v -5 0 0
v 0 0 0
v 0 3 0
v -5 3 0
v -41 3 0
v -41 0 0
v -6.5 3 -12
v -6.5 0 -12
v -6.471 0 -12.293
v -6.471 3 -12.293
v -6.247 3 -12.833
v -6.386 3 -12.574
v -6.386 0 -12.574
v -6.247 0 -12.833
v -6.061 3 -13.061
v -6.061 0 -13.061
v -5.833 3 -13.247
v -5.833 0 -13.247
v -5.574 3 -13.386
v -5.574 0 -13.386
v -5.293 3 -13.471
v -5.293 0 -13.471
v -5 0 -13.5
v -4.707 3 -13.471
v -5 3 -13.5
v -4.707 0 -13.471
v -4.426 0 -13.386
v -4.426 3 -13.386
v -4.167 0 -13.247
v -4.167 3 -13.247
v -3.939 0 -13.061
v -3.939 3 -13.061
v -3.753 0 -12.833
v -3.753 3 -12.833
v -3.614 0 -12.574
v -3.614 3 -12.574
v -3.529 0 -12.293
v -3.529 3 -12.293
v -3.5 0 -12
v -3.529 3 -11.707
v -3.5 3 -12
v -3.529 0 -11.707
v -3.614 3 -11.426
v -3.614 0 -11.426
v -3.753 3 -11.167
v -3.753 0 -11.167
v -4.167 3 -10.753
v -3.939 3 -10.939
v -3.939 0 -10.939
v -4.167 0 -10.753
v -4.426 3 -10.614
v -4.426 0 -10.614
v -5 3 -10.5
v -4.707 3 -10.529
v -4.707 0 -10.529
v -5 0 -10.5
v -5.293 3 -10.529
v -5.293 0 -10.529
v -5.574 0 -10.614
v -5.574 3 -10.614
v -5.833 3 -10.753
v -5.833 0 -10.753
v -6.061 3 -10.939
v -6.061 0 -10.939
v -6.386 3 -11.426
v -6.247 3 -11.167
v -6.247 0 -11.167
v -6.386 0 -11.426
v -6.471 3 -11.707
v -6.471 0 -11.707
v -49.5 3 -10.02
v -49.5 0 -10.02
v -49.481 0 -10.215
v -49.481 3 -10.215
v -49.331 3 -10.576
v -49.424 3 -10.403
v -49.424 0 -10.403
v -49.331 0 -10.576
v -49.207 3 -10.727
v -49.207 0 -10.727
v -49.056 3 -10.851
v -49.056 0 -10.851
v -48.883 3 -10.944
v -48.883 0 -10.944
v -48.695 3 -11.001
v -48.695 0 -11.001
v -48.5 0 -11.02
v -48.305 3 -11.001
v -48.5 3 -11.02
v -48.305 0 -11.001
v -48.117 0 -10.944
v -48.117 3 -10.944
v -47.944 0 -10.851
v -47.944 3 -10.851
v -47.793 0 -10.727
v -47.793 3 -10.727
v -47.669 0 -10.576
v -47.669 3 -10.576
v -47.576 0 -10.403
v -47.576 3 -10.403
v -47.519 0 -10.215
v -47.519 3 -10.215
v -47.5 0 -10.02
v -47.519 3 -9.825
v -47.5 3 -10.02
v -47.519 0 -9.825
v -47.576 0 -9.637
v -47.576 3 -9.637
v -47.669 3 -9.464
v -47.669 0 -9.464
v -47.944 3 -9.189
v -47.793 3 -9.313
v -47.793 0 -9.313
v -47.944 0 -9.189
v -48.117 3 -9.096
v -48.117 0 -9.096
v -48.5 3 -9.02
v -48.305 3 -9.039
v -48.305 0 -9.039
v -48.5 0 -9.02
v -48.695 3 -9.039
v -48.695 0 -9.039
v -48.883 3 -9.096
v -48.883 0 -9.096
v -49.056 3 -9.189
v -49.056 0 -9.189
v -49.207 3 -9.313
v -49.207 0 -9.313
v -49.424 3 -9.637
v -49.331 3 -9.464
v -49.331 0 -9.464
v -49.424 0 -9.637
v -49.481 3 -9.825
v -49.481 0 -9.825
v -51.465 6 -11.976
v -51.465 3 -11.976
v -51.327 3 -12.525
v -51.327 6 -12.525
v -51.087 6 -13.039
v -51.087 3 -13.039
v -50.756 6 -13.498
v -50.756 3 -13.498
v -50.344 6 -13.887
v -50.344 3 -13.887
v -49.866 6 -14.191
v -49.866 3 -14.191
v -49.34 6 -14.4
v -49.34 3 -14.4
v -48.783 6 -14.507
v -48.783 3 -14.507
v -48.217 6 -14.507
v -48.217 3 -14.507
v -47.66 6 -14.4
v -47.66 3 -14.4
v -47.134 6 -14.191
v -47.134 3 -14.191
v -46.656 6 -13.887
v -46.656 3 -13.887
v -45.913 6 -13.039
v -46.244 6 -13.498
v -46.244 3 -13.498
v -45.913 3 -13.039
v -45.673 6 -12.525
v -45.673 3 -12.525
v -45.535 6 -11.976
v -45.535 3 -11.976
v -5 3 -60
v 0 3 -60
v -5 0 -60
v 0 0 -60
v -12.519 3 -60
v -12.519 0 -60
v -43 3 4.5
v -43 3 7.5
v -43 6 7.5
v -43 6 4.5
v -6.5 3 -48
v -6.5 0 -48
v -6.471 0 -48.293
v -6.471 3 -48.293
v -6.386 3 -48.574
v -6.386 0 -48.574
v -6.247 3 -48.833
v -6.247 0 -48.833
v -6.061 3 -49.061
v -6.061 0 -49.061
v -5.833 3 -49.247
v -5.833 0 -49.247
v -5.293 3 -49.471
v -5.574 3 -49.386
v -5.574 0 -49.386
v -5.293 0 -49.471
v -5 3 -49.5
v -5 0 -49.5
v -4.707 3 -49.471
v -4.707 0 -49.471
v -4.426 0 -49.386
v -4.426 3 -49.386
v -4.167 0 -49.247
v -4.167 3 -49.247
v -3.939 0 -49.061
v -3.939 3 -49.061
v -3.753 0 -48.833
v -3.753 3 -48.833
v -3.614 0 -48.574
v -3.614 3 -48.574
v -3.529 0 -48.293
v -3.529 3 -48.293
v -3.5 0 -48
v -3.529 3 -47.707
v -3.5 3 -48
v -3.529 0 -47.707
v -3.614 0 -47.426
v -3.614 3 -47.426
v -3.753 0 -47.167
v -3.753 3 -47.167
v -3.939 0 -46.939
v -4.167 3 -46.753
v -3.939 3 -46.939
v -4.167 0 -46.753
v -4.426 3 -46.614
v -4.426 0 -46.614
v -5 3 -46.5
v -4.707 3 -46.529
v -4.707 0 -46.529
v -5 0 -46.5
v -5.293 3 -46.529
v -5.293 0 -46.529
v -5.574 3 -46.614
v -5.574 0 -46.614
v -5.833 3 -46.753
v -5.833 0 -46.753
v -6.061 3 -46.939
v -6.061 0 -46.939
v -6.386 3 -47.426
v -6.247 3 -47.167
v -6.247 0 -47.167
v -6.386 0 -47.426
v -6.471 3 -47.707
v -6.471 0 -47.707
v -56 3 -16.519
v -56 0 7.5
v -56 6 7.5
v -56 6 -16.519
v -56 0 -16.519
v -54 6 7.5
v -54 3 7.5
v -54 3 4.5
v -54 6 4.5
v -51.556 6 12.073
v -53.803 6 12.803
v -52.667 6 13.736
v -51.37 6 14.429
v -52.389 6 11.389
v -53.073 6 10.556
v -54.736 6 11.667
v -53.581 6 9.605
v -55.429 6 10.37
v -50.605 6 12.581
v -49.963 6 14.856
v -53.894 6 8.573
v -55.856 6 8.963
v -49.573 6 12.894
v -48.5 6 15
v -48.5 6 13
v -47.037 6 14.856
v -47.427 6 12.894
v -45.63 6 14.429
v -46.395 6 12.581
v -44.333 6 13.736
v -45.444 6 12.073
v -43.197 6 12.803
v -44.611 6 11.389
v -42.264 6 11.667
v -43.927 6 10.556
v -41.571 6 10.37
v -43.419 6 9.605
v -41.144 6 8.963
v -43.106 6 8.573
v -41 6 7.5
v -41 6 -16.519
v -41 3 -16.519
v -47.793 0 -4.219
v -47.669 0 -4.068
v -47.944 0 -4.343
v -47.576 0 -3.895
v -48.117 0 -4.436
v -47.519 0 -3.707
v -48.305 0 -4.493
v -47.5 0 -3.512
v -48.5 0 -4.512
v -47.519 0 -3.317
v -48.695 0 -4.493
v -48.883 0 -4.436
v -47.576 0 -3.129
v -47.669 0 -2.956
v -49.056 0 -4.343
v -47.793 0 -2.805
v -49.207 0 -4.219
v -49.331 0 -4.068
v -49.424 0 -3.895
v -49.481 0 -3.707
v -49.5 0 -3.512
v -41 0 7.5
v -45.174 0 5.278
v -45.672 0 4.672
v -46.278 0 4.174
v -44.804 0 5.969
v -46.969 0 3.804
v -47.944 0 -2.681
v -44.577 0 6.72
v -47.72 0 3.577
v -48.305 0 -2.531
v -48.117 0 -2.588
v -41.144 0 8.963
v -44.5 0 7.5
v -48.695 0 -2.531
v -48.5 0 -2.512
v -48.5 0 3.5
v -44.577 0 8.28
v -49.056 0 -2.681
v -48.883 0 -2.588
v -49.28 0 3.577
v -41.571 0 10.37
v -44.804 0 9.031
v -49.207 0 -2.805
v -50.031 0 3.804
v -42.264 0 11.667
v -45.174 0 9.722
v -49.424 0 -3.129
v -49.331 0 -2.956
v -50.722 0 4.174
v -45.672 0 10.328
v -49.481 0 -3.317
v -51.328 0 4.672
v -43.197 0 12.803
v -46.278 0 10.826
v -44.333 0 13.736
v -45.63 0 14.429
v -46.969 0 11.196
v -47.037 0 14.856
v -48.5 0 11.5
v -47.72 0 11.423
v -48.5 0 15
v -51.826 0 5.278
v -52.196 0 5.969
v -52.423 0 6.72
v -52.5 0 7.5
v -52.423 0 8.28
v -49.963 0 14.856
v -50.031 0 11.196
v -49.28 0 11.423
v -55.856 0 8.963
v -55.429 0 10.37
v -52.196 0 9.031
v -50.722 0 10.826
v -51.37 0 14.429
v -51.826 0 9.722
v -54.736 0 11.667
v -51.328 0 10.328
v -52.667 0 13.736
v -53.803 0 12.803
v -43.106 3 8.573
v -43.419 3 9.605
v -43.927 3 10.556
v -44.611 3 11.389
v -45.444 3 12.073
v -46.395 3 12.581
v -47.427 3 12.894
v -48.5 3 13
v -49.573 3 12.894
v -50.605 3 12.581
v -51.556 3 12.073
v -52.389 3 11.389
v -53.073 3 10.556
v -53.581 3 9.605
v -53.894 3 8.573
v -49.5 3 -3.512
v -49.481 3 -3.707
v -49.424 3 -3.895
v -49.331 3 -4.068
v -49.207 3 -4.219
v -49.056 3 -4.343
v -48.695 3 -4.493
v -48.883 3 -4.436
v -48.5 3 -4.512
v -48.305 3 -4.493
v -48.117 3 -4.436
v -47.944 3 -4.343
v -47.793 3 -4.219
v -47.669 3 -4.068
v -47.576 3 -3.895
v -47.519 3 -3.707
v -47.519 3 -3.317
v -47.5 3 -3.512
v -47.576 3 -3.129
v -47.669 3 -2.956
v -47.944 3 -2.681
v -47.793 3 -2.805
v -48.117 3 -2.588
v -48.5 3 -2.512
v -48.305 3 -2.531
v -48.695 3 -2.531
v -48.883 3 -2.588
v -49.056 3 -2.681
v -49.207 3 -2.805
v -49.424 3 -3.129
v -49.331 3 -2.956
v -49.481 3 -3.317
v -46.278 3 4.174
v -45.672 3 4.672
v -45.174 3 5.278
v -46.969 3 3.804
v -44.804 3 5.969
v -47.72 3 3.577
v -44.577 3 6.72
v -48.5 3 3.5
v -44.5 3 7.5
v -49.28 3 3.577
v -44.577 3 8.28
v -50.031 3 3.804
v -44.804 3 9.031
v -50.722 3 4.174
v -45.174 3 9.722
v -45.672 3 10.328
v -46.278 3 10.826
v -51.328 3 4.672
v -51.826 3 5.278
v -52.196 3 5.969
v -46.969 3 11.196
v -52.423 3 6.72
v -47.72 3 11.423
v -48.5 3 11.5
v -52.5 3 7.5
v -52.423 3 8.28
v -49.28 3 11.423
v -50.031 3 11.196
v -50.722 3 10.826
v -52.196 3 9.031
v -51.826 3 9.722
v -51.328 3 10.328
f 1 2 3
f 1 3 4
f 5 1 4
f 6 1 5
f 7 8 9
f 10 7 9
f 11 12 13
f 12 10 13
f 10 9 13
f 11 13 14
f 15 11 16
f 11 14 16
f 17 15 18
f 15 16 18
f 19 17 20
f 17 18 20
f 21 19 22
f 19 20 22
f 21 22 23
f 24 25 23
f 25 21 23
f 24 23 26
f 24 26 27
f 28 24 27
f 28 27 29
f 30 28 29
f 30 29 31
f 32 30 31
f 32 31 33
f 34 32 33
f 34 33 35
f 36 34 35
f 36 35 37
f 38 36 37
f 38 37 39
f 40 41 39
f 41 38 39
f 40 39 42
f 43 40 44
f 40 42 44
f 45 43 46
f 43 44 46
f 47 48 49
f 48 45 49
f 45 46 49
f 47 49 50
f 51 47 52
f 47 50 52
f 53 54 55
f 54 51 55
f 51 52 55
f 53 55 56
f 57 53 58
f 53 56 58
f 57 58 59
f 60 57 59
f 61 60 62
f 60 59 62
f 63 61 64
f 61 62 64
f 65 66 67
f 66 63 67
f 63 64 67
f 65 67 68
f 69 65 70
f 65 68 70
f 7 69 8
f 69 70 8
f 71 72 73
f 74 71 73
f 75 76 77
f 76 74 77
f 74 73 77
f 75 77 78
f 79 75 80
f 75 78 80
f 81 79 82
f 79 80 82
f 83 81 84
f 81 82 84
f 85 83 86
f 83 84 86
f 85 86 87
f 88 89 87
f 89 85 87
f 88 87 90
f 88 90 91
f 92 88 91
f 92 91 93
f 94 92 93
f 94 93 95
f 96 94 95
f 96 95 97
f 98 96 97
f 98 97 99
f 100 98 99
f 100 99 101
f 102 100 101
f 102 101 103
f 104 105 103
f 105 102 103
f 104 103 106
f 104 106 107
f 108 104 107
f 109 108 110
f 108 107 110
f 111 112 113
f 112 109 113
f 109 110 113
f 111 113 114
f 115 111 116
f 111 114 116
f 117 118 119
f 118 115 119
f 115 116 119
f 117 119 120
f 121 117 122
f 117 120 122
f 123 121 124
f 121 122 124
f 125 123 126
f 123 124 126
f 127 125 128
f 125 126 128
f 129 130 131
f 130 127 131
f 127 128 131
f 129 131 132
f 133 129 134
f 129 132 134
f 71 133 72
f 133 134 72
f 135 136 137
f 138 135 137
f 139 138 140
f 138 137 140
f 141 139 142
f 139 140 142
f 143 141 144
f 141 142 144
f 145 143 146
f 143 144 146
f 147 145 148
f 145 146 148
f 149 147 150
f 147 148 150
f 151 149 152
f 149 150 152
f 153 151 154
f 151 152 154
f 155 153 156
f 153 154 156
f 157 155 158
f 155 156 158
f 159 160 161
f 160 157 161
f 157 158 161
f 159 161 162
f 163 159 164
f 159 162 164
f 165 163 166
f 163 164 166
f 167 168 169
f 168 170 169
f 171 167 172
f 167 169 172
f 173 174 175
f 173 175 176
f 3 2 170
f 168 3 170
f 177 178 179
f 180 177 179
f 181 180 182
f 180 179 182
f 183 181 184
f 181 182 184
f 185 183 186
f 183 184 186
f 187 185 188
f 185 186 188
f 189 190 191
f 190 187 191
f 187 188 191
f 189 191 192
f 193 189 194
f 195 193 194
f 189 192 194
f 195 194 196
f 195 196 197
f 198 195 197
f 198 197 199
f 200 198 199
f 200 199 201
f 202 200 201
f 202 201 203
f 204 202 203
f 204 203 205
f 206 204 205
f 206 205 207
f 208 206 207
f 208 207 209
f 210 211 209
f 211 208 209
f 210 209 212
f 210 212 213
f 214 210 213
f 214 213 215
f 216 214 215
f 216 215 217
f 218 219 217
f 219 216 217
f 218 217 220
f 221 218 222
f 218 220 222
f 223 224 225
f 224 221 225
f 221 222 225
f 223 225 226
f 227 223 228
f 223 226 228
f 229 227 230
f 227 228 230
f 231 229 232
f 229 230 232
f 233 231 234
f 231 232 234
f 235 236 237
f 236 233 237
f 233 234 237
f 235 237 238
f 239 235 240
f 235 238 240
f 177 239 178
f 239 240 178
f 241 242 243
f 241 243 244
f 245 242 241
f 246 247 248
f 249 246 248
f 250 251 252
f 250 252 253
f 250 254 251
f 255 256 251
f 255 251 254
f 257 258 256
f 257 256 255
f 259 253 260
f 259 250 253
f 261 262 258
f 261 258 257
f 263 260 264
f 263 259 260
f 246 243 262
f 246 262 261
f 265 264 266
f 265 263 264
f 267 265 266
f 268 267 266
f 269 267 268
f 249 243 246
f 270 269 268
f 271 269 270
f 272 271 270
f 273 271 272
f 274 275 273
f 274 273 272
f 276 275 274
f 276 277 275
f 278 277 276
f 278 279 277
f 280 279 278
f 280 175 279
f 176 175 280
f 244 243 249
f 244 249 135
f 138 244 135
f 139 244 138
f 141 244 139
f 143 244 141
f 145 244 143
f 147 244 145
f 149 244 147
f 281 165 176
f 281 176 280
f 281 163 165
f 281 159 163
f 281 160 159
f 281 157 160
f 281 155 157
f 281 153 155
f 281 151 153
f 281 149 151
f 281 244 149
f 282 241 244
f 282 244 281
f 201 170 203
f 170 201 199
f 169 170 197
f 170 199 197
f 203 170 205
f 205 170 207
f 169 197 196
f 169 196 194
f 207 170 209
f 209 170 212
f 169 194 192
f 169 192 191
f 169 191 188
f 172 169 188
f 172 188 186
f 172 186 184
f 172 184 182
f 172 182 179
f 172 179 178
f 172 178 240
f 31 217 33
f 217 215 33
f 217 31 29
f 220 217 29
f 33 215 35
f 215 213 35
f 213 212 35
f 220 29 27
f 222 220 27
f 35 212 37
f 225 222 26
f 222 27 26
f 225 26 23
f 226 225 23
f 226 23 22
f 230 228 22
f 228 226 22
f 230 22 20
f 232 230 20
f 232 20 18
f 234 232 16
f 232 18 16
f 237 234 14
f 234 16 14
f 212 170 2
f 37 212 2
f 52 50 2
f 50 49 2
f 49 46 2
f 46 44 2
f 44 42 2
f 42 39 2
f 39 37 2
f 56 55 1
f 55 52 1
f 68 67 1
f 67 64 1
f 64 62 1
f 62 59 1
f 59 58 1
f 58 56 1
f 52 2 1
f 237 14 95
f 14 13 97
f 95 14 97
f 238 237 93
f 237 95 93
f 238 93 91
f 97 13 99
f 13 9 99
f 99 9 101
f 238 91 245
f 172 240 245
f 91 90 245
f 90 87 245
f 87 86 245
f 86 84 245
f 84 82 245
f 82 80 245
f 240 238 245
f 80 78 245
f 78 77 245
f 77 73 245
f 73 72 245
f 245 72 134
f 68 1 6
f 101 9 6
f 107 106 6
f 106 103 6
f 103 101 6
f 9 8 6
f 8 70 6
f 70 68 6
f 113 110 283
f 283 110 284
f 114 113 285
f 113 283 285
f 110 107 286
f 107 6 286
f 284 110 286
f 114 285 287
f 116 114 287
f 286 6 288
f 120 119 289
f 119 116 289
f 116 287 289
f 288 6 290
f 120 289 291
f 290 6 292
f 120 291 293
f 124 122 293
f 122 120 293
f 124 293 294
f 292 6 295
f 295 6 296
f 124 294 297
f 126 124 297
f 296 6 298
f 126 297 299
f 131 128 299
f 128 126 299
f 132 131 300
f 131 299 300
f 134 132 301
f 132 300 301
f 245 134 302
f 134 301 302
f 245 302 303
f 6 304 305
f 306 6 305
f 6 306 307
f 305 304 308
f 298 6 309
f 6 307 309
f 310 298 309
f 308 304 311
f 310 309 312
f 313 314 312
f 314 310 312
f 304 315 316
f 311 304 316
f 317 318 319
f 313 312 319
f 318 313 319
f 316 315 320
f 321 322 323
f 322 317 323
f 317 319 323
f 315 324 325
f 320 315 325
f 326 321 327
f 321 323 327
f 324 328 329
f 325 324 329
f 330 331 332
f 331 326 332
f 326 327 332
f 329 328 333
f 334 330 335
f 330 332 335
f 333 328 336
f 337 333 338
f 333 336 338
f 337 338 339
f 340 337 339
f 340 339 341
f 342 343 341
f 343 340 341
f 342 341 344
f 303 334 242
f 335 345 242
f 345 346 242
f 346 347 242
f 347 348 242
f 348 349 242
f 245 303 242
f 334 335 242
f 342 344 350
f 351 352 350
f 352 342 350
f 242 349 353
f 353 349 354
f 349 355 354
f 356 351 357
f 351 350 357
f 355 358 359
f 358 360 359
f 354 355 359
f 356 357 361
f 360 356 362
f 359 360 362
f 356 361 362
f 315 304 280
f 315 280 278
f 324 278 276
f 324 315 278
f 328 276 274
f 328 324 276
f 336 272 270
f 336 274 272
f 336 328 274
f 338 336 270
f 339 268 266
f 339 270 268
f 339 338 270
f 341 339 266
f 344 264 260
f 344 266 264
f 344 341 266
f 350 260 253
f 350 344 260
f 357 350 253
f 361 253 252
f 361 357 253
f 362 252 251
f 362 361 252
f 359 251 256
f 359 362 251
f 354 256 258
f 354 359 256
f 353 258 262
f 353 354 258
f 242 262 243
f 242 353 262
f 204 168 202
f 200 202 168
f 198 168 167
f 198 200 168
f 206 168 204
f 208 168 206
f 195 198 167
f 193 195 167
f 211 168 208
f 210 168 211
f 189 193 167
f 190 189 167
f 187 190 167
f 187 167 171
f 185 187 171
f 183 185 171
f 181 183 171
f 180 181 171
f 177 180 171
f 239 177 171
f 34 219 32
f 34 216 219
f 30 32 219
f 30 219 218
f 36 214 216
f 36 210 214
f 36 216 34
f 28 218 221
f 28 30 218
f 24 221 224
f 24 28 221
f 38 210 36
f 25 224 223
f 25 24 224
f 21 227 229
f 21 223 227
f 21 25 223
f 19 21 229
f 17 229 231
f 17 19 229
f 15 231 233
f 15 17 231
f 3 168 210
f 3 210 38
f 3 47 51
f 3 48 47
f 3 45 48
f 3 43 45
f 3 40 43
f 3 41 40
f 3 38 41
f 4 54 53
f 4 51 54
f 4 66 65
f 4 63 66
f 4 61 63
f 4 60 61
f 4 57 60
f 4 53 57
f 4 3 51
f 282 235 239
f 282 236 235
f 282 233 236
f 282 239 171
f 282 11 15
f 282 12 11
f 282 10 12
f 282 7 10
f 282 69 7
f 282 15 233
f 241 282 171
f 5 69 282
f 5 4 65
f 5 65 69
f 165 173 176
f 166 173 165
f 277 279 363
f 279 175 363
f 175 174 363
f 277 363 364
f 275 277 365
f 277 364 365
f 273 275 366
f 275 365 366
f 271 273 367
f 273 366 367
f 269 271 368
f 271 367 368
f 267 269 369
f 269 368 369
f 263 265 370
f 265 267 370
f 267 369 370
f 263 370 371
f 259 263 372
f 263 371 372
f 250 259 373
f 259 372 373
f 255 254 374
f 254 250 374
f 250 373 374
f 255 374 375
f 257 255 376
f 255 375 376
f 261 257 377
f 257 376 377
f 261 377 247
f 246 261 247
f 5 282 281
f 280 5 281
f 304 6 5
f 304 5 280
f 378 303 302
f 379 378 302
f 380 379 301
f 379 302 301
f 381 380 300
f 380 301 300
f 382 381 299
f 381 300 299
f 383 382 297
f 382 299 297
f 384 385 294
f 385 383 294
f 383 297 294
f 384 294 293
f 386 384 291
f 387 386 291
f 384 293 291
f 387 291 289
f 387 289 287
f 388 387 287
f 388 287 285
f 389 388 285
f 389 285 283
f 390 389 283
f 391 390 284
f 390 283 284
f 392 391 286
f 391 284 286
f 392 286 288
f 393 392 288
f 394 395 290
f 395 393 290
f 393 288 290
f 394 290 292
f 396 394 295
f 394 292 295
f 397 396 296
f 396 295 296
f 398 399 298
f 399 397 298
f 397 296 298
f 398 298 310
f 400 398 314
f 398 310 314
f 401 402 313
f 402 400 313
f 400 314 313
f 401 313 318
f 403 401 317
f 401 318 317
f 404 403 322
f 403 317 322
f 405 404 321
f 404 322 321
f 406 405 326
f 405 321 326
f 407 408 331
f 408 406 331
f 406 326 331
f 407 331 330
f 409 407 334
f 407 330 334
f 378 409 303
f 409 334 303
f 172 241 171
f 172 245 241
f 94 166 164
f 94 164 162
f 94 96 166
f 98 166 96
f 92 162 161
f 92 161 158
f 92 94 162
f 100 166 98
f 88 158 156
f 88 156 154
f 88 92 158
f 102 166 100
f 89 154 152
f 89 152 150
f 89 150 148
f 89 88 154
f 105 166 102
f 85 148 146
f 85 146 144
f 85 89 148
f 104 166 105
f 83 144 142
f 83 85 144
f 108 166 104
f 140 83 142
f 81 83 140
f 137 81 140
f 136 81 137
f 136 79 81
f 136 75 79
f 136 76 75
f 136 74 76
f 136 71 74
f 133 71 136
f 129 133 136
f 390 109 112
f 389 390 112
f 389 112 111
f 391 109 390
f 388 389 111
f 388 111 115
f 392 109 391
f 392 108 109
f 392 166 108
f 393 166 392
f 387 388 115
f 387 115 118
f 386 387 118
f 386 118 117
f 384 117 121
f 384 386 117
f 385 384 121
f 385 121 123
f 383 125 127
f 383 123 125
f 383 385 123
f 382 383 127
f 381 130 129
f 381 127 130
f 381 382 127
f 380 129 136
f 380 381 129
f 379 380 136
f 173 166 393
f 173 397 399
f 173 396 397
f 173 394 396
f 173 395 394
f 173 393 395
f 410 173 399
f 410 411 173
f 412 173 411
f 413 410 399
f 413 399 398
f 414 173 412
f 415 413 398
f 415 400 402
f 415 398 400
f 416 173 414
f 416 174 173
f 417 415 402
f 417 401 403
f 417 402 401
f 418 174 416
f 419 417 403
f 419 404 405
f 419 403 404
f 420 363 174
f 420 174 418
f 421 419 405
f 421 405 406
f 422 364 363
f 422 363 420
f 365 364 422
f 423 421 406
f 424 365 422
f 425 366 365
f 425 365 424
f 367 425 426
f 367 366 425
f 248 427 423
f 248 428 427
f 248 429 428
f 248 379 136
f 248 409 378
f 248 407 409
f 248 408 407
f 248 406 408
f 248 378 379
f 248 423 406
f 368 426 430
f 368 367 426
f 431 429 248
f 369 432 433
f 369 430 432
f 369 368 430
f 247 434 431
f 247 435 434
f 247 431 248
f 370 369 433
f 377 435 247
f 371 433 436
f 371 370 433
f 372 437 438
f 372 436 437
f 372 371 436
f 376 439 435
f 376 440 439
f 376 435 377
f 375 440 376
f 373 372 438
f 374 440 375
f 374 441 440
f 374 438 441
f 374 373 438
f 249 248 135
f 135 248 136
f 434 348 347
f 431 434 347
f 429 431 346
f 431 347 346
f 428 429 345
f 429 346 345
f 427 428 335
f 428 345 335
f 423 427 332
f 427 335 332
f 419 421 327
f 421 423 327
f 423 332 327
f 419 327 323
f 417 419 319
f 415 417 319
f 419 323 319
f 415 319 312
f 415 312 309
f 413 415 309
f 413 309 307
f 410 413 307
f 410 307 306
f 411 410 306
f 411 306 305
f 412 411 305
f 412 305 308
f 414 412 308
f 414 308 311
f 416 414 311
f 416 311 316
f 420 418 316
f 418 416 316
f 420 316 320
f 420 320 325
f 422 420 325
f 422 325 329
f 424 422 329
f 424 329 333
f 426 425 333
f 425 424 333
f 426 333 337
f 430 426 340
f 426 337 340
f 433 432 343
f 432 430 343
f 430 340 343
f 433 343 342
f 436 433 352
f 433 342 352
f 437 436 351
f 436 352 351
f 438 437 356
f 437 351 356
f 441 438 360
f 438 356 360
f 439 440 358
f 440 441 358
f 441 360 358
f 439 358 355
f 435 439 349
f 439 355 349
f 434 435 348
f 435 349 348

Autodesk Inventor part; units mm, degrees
ref_plane "YZ Plane" through (0, 0, 0) normal (1, 0, 0) x (0, 1, 0)
ref_plane "XZ Plane" through (0, 0, 0) normal (0, 1, 0) x (-1, 0, 0)
ref_plane "XY Plane" through (0, 0, 0) normal (0, 0, 1) x (1, 0, 0)
sketch "Sketch3" plane through (0, 0, 0) normal (0, 1, 0) x (-1, 0, 0)
  line L0 (0, 0) -> (0, -60)
  line L1 (0, 0) -> (60, 0) construction
  line L2 (0, -60) -> (12.519, -60)
  line L3 (0, 0) -> (41, 0)
  line L4 (41, 0) -> (41, 7.5)
  arc A0 (56, 7.5) -> (41, 7.5) centre (48.5, 7.5) ccw
  line L5 (56, 7.5) -> (56, -16.519)
  line L6 (56, -16.519) -> (12.519, -60)
  line L7 (0, -30) -> (5, -30)
  line L8 (5, -60) -> (5, -48)
  line L9 (5, 0) -> (5, -12)
  circle A1 centre (5, -12) radius 1.5
  circle A2 centre (5, -48) radius 1.5
  circle A3 centre (48.5, 7.5) radius 4
  line L10 (48.5, 7.5) -> (48.5, -3.512)
  line L11 (48.5, -3.512) -> (48.5, -10.02)
  circle A4 centre (48.5, -3.512) radius 1
  circle A5 centre (48.5, -10.02) radius 1
  dimension "d6" = 60
  dimension "d7" = 90
  dimension "d8" = 12.519
  dimension "d9" = 41
  dimension "d10" = 7.5
  dimension "d11" = 15
  dimension "d13" = 24.019
  dimension "d18" = 5
  dimension "d19" = 12
  dimension "d20" = 12
  dimension "d21" = 3
  dimension "d22" = 3
  dimension "d25" = 8
  dimension "d26" = 11.012
  dimension "d27" = 6.508
  dimension "d28" = 2
  dimension "d29" = 2
extrude "Extrusion1" add sketch "Sketch3" along normal blind 3
sketch "Sketch6" plane through (0, 3, 0) normal (0, 1, 0) x (1, 0, 0)
  circle A0 centre (-48.5, -7.5) radius 4 projected
  circle A1 centre (-5, 48) radius 1.5 projected
  circle A2 centre (-5, 12) radius 1.5 projected
  circle A3 centre (-48.5, 10.02) radius 1 projected
  circle A4 centre (-48.5, 3.512) radius 1 projected
  line L0 (0, 0) -> (0, 60) projected
  line L1 (0, 60) -> (-12.519, 60) projected
  line L2 (-12.519, 60) -> (-56, 16.519) projected
  line L3 (-56, 16.519) -> (-56, -7.5) projected
  arc A5 (-56, -7.5) -> (-41, -7.5) centre (-48.5, -7.5) ccw projected
  line L4 (-41, -7.5) -> (-41, 0) projected
  line L5 (-41, 0) -> (0, 0) projected
  line L6 (-56, 16.519) -> (-41, 16.519)
  line L7 (-41, -7.5) -> (-41, 0) projected
  line L8 (-41, 16.519) -> (-41, 0)
  circle A6 centre (-48.5, -7.5) radius 5.5
  line L9 (-48.5, 10.02) -> (-48.5, 11.52)
  circle A7 centre (-48.5, 11.52) radius 3
  line L10 (-54, -7.5) -> (-54, -4.5)
  line L11 (-43, -7.5) -> (-43, -4.5)
  line L12 (-43, -4.5) -> (-45.5349, 11.9762)
  line L13 (-54, -4.5) -> (-51.4651, 11.9762)
  dimension "d31" = 11
  dimension "d32" = 1.5
  dimension "d33" = 6
  dimension "d34" = 3
extrude "Extrusion3" add sketch "Sketch6" along normal blind 3 contours L4 A5 L3 L6 L8
properties part number "sideplateshaft_std"
